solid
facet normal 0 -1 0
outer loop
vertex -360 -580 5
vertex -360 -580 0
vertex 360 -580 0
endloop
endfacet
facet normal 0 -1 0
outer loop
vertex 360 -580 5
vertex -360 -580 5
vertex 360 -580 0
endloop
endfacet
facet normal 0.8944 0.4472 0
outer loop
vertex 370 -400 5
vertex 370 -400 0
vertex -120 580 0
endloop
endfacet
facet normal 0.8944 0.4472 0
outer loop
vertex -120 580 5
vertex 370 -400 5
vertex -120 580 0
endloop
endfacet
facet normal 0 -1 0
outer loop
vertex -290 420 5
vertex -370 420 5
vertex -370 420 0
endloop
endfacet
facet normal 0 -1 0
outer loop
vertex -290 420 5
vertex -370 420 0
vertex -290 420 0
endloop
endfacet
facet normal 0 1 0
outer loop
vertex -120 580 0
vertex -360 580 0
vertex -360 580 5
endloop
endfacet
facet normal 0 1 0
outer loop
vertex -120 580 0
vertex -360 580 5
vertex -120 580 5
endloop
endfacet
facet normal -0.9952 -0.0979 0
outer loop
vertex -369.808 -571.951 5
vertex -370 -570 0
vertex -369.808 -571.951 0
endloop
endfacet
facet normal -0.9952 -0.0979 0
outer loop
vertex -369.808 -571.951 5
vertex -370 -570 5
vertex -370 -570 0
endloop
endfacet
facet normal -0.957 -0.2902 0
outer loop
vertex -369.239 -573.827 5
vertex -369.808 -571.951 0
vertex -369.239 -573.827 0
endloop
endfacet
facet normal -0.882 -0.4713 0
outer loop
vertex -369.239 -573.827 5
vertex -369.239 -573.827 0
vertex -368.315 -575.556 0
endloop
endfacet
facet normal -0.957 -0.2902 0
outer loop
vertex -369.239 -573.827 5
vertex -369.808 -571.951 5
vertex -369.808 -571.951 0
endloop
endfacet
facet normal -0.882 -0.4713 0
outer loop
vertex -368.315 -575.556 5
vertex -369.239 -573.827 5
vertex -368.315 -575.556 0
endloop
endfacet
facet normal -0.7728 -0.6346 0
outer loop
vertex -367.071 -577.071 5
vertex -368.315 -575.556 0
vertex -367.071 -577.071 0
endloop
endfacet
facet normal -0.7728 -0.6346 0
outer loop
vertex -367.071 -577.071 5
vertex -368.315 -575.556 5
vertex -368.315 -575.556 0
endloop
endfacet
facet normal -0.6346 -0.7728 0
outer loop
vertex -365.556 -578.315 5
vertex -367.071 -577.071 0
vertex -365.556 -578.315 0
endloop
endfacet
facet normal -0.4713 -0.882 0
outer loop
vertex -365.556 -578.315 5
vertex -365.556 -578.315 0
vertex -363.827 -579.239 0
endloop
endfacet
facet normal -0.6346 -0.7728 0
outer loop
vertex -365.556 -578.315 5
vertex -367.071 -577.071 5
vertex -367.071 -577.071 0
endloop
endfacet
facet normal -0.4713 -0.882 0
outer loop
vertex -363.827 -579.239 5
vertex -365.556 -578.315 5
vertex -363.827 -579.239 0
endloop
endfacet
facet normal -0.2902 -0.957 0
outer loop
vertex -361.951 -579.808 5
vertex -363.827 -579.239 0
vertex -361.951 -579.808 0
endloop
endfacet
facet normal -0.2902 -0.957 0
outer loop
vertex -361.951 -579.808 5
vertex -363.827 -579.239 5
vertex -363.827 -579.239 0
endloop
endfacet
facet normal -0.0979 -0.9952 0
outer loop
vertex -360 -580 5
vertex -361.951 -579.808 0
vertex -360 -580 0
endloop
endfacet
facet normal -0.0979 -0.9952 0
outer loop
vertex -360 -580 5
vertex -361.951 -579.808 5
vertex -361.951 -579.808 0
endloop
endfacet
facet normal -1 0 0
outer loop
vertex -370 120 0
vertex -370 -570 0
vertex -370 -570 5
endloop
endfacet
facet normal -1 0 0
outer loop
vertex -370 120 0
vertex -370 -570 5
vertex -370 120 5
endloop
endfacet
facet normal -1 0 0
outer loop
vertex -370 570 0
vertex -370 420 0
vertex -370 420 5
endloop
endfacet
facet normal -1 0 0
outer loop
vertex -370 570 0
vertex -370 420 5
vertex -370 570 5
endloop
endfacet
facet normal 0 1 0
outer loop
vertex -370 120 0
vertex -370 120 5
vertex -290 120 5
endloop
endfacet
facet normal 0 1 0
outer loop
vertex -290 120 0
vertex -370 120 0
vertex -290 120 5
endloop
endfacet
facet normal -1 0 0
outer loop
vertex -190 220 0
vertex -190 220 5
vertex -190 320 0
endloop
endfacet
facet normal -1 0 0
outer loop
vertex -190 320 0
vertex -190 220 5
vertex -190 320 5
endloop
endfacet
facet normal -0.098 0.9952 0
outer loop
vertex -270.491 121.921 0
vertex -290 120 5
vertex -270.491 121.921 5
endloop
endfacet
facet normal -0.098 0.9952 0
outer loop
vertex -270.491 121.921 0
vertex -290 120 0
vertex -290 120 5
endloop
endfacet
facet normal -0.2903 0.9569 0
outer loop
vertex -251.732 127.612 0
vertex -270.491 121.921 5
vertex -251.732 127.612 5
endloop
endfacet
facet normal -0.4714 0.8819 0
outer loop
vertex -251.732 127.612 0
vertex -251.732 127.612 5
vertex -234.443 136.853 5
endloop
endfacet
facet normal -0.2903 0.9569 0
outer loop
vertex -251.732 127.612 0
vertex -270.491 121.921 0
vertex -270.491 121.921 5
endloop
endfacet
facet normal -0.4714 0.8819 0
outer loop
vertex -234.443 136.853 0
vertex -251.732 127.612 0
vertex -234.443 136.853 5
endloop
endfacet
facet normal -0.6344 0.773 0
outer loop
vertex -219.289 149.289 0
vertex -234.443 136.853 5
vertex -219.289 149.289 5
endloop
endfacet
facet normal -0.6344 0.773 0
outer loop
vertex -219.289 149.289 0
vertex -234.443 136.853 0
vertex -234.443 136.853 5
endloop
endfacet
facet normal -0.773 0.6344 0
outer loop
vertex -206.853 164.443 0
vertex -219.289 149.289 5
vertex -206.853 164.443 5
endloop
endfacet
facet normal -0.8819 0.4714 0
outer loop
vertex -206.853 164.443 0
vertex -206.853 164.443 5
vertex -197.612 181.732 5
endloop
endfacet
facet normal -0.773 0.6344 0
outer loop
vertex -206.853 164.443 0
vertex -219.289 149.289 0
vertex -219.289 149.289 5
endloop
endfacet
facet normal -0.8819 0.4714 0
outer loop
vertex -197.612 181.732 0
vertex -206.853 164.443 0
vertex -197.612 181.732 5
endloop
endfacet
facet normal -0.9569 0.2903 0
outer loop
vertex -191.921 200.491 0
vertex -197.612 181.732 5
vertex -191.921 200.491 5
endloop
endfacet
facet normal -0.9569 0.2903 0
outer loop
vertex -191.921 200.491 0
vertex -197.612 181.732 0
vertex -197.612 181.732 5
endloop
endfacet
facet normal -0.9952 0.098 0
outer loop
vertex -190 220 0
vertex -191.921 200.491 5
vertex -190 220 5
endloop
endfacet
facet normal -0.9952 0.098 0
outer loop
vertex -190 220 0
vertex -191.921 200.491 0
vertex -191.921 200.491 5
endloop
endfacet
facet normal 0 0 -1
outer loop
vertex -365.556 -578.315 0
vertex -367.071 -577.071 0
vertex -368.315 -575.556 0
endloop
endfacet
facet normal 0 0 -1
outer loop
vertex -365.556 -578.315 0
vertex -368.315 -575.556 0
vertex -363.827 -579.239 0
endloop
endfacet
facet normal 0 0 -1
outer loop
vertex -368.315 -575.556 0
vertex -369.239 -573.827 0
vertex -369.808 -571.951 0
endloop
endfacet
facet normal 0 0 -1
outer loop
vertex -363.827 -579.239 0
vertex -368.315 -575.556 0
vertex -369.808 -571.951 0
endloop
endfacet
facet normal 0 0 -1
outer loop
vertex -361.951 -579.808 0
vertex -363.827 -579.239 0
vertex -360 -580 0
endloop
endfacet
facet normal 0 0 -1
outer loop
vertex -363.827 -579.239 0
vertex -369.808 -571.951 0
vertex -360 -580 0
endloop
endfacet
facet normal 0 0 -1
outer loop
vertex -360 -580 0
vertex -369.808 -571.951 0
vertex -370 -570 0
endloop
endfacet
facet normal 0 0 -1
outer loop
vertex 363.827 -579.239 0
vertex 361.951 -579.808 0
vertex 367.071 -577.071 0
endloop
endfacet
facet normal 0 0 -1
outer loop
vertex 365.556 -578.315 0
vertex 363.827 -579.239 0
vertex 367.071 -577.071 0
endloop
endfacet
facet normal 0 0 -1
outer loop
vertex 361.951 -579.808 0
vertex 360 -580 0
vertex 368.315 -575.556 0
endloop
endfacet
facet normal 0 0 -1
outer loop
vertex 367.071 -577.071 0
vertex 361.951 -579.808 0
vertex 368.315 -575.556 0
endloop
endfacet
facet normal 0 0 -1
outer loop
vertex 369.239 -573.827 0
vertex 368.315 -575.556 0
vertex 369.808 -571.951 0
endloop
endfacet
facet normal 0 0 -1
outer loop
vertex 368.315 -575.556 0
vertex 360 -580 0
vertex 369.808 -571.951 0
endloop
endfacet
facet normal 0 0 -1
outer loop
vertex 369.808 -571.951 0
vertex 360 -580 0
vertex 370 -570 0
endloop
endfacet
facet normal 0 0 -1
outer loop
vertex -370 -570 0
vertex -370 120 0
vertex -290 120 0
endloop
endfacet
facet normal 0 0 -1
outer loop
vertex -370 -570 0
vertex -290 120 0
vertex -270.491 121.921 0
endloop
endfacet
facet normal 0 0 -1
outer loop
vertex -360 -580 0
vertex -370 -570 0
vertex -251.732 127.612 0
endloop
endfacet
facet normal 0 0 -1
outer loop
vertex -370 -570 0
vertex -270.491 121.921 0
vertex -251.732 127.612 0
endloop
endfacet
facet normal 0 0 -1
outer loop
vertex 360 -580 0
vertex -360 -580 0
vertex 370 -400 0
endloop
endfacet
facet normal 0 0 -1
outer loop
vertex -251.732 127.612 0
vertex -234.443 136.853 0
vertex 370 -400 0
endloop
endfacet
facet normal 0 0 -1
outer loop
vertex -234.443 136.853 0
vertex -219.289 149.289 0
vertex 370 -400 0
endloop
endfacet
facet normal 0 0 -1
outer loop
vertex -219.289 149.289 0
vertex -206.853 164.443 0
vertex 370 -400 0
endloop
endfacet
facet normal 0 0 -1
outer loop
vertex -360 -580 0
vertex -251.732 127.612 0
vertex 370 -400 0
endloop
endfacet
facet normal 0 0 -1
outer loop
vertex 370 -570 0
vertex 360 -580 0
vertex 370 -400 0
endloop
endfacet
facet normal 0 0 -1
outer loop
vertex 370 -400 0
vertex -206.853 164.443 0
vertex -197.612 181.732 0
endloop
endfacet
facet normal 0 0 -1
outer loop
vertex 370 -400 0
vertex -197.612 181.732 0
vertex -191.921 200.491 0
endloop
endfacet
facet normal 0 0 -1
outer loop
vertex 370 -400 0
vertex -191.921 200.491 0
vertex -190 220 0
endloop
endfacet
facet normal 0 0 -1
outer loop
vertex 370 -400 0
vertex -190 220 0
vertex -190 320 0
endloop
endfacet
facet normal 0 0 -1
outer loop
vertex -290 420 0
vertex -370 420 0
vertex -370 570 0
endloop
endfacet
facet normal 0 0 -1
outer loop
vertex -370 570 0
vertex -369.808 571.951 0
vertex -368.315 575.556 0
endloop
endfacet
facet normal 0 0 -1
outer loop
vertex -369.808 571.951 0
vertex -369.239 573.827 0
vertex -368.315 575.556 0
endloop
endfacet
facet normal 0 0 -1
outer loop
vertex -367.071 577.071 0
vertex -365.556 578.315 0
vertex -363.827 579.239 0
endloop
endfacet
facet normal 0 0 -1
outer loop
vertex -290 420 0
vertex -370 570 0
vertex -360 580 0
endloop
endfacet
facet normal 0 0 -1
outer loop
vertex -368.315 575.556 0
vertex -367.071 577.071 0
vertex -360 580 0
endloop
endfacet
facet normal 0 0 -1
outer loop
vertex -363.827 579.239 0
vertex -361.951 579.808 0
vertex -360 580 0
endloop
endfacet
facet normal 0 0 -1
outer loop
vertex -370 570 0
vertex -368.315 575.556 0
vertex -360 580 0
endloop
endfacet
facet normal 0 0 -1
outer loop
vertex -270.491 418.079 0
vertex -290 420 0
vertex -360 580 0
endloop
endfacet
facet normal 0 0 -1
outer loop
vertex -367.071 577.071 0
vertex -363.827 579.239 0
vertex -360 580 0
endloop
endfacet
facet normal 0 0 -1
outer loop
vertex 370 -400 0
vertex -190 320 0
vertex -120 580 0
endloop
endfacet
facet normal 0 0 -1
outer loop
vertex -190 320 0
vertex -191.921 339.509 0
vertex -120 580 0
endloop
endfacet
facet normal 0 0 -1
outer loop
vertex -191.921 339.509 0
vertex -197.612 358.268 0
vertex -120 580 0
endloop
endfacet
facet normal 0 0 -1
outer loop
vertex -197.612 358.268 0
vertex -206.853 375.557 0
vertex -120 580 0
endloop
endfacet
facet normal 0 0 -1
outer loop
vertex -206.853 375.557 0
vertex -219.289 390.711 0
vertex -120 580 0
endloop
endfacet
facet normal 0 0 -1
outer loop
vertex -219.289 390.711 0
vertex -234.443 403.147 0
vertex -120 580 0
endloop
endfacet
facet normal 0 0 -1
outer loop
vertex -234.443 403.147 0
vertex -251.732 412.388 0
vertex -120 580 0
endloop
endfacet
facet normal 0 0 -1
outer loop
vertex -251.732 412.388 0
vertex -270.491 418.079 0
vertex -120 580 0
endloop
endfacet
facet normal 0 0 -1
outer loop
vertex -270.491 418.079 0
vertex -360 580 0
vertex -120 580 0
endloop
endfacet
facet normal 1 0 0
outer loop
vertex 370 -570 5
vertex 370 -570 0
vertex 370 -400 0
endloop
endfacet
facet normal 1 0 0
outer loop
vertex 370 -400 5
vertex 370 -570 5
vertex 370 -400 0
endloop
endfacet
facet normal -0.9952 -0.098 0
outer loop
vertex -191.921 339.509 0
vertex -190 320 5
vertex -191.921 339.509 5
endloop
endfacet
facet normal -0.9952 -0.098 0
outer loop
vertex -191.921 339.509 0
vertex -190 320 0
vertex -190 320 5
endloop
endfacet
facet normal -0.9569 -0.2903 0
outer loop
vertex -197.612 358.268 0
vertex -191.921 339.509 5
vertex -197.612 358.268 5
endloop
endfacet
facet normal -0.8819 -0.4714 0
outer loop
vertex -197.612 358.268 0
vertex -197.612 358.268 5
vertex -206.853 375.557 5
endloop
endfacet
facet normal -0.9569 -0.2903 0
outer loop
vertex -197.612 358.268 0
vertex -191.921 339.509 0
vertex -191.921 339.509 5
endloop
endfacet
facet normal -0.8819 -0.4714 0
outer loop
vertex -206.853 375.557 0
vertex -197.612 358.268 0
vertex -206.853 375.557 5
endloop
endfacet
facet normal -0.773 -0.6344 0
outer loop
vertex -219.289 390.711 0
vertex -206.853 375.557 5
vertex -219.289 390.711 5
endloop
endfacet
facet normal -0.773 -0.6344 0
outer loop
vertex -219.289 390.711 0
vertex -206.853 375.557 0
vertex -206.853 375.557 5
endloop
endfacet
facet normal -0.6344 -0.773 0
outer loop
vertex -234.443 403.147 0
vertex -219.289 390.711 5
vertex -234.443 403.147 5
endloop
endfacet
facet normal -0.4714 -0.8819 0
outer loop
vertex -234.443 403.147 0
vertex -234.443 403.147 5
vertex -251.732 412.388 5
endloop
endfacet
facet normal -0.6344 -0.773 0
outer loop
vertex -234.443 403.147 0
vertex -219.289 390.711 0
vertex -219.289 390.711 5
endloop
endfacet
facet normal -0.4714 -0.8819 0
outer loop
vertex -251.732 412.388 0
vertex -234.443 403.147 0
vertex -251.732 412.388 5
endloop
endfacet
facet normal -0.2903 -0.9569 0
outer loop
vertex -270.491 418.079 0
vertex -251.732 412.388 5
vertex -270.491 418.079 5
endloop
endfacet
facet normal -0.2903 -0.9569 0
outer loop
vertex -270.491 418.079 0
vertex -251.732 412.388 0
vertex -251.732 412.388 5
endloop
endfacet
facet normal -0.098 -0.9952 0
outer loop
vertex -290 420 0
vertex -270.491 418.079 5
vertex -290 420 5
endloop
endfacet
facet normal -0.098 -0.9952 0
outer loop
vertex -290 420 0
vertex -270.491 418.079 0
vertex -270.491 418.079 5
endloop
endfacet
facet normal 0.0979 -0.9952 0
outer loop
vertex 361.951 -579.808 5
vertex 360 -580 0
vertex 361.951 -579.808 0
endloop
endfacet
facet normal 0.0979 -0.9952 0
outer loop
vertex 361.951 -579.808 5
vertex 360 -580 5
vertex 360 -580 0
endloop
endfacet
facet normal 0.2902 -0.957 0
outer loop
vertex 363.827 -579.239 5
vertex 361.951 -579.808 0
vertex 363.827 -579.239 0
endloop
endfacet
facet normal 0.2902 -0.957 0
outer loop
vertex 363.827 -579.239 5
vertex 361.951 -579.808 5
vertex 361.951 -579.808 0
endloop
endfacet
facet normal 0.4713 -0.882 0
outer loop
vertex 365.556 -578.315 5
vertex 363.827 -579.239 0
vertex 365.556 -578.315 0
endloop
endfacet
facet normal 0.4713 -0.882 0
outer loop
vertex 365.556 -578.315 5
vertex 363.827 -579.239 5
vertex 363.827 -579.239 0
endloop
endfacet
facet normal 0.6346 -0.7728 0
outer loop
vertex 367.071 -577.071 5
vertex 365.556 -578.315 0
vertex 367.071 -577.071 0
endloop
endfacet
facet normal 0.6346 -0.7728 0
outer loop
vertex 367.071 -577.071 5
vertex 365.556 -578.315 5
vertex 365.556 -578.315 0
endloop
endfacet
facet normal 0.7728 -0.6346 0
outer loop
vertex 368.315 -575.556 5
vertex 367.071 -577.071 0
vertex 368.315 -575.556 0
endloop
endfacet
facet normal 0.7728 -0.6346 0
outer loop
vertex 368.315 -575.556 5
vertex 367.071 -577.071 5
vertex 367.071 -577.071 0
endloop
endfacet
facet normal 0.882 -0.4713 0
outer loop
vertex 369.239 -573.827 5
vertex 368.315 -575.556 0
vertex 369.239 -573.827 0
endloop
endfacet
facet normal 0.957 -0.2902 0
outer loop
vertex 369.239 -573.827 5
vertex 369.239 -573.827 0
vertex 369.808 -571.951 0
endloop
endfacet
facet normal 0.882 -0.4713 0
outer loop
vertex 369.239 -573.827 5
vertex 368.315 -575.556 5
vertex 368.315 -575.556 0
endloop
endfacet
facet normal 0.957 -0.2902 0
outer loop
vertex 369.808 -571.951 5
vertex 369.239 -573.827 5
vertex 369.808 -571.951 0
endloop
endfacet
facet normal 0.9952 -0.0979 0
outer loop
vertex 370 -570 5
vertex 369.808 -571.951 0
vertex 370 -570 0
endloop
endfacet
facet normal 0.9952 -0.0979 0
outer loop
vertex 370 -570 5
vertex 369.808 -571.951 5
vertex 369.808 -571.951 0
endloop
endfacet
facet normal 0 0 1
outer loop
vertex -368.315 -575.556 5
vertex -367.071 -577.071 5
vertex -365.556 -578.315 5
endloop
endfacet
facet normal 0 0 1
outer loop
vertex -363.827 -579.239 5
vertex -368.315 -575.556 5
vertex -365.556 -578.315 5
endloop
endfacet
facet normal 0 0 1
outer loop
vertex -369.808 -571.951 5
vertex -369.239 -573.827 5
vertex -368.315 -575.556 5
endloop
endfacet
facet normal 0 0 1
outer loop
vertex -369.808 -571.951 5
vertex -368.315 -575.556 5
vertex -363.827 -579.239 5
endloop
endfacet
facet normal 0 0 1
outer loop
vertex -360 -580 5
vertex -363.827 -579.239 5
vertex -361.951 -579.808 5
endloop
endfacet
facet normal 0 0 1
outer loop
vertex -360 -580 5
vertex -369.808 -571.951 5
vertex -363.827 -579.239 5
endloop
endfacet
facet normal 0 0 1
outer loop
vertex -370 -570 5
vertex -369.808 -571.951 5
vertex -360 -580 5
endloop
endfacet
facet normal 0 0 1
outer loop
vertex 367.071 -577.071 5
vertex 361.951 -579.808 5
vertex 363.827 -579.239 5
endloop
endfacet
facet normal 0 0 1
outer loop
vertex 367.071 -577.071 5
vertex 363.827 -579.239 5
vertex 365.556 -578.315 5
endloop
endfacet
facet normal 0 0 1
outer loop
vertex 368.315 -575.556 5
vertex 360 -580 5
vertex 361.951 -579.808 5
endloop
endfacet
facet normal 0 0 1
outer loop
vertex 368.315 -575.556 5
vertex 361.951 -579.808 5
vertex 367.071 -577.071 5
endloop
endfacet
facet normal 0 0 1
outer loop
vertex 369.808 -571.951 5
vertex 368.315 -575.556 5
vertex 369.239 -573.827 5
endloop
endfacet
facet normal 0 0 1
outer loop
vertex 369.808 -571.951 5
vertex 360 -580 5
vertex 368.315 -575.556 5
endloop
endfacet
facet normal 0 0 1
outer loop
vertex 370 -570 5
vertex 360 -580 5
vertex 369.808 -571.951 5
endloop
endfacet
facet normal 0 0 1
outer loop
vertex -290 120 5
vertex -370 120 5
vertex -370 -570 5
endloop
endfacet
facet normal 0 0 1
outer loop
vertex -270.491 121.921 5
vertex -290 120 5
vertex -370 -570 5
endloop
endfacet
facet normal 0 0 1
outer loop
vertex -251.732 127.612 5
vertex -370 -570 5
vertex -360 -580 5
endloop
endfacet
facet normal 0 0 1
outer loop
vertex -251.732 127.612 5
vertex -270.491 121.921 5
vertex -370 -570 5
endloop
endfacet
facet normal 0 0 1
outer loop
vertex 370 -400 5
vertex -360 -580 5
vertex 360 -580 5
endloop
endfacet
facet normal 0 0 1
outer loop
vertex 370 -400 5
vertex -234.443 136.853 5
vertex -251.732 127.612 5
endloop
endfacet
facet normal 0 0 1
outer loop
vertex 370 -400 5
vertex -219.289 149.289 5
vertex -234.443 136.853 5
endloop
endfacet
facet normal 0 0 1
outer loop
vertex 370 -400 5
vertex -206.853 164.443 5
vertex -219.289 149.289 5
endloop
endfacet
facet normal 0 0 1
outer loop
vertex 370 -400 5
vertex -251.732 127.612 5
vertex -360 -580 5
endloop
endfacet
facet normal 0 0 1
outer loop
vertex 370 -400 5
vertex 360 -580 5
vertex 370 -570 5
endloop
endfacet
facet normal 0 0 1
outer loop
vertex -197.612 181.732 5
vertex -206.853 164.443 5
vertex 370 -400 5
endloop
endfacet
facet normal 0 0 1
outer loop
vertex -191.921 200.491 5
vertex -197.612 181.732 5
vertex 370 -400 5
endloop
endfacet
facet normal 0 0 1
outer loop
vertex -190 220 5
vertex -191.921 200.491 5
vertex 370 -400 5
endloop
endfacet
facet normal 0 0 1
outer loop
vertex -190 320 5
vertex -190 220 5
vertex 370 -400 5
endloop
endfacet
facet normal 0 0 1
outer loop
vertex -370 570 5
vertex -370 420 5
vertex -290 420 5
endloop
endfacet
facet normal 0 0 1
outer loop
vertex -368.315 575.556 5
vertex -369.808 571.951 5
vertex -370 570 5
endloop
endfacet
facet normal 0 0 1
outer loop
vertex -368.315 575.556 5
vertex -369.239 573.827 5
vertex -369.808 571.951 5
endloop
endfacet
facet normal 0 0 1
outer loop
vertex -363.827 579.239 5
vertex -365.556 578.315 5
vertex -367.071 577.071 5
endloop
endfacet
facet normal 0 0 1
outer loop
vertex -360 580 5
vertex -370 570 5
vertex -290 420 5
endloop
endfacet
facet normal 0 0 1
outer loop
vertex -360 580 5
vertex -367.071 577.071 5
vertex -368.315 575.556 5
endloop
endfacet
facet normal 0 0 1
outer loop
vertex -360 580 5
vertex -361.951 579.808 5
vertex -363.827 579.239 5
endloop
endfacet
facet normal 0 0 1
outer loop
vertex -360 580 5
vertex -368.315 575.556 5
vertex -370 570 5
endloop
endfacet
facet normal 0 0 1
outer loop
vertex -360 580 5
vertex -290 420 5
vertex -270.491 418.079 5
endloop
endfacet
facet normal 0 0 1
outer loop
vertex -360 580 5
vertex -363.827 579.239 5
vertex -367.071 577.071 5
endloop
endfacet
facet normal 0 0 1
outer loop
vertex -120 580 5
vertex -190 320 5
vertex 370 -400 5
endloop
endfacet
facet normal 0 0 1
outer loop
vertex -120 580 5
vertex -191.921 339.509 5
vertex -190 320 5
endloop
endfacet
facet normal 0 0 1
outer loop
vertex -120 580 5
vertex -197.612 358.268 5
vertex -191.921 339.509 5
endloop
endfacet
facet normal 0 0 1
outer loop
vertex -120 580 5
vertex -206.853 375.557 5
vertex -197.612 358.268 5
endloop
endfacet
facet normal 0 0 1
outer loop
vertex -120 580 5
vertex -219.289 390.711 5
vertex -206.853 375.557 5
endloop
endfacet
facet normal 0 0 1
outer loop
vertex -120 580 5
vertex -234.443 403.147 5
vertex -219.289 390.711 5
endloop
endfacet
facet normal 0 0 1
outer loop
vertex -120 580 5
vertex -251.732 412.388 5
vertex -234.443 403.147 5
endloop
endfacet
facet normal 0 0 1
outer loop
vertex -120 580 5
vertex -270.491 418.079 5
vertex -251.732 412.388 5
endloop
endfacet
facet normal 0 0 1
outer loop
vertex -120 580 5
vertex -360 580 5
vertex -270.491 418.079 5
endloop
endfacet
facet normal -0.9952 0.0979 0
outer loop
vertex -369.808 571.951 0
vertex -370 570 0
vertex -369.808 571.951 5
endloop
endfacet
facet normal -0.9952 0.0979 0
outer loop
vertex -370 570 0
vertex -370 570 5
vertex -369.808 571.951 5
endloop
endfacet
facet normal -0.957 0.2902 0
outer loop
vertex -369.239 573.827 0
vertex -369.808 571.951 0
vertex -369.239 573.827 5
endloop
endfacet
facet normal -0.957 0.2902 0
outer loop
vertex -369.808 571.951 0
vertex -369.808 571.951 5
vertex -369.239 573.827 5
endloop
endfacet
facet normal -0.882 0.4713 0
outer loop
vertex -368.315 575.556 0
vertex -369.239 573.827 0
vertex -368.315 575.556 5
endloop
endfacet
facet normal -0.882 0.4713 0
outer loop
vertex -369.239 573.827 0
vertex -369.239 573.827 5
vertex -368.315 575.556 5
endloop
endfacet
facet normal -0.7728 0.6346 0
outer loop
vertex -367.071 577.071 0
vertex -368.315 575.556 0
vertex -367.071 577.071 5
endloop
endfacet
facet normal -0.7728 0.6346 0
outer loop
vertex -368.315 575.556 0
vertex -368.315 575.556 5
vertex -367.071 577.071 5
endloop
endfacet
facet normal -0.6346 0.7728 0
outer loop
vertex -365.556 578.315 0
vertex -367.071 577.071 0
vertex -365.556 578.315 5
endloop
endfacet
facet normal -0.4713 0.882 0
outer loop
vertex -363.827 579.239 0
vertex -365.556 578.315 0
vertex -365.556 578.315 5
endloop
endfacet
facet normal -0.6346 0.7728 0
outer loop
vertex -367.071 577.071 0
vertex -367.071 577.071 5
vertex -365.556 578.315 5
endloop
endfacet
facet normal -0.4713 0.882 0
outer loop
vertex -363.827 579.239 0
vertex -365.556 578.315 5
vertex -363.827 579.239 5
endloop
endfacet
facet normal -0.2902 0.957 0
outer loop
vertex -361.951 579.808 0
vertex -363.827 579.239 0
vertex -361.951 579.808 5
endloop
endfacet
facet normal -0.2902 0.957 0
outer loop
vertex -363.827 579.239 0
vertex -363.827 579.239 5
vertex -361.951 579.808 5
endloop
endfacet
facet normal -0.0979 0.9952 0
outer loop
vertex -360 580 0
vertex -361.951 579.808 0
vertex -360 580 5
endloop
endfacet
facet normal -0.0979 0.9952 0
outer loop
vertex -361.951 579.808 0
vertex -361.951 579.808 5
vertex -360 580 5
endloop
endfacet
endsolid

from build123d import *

# Parameters (mm, degrees)
SKETCH1_W           = 740
SKETCH1_H           = 1160
BOSS_EXTRUDE1_DEPTH = 5
FILLET1_R           = 10
CUT_EXTRUDE1_DEPTH  = 688.986191722
SKETCH3_W           = 360
SKETCH3_H           = 300
CUT_EXTRUDE2_DEPTH  = 688.986191722
FILLET2_R           = 100


with BuildPart() as part:
    # Sketch1 → Boss-Extrude1 (new body)
    with BuildSketch(Plane.XY):
        Rectangle(SKETCH1_W, SKETCH1_H)
    extrude(amount=BOSS_EXTRUDE1_DEPTH)

    # Fillet1
    fillet1_edges = [part.edges().sort_by_distance(p)[0] for p in [
        (370, -580, 2.5),
        (-370, -580, 2.5),
        (-370, 580, 2.5),
        (370, 580, 2.5),
    ]]
    fillet(fillet1_edges, radius=FILLET1_R)

    # Sketch2 → Cut-Extrude1 (cut, through all)
    with BuildSketch(Plane(origin=(0, 0, 0), x_dir=(-1, 0, 0), z_dir=(0, 0, -1))):
        Polygon((-370, -400), (120, 580), (-370, 580), align=None)
    extrude(amount=-CUT_EXTRUDE1_DEPTH, mode=Mode.SUBTRACT)

    # Sketch3 → Cut-Extrude2 (cut, through all)
    with BuildSketch(Plane.XY.offset(5)):
        with Locations((-370, 270)):
            Rectangle(SKETCH3_W, SKETCH3_H)
    extrude(amount=-CUT_EXTRUDE2_DEPTH, mode=Mode.SUBTRACT)

    # Fillet2
    fillet2_edges = [part.edges().sort_by_distance(p)[0] for p in [
        (-190, 120, 2.5),
        (-190, 420, 2.5),
    ]]
    fillet(fillet2_edges, radius=FILLET2_R)


solid = part.part
